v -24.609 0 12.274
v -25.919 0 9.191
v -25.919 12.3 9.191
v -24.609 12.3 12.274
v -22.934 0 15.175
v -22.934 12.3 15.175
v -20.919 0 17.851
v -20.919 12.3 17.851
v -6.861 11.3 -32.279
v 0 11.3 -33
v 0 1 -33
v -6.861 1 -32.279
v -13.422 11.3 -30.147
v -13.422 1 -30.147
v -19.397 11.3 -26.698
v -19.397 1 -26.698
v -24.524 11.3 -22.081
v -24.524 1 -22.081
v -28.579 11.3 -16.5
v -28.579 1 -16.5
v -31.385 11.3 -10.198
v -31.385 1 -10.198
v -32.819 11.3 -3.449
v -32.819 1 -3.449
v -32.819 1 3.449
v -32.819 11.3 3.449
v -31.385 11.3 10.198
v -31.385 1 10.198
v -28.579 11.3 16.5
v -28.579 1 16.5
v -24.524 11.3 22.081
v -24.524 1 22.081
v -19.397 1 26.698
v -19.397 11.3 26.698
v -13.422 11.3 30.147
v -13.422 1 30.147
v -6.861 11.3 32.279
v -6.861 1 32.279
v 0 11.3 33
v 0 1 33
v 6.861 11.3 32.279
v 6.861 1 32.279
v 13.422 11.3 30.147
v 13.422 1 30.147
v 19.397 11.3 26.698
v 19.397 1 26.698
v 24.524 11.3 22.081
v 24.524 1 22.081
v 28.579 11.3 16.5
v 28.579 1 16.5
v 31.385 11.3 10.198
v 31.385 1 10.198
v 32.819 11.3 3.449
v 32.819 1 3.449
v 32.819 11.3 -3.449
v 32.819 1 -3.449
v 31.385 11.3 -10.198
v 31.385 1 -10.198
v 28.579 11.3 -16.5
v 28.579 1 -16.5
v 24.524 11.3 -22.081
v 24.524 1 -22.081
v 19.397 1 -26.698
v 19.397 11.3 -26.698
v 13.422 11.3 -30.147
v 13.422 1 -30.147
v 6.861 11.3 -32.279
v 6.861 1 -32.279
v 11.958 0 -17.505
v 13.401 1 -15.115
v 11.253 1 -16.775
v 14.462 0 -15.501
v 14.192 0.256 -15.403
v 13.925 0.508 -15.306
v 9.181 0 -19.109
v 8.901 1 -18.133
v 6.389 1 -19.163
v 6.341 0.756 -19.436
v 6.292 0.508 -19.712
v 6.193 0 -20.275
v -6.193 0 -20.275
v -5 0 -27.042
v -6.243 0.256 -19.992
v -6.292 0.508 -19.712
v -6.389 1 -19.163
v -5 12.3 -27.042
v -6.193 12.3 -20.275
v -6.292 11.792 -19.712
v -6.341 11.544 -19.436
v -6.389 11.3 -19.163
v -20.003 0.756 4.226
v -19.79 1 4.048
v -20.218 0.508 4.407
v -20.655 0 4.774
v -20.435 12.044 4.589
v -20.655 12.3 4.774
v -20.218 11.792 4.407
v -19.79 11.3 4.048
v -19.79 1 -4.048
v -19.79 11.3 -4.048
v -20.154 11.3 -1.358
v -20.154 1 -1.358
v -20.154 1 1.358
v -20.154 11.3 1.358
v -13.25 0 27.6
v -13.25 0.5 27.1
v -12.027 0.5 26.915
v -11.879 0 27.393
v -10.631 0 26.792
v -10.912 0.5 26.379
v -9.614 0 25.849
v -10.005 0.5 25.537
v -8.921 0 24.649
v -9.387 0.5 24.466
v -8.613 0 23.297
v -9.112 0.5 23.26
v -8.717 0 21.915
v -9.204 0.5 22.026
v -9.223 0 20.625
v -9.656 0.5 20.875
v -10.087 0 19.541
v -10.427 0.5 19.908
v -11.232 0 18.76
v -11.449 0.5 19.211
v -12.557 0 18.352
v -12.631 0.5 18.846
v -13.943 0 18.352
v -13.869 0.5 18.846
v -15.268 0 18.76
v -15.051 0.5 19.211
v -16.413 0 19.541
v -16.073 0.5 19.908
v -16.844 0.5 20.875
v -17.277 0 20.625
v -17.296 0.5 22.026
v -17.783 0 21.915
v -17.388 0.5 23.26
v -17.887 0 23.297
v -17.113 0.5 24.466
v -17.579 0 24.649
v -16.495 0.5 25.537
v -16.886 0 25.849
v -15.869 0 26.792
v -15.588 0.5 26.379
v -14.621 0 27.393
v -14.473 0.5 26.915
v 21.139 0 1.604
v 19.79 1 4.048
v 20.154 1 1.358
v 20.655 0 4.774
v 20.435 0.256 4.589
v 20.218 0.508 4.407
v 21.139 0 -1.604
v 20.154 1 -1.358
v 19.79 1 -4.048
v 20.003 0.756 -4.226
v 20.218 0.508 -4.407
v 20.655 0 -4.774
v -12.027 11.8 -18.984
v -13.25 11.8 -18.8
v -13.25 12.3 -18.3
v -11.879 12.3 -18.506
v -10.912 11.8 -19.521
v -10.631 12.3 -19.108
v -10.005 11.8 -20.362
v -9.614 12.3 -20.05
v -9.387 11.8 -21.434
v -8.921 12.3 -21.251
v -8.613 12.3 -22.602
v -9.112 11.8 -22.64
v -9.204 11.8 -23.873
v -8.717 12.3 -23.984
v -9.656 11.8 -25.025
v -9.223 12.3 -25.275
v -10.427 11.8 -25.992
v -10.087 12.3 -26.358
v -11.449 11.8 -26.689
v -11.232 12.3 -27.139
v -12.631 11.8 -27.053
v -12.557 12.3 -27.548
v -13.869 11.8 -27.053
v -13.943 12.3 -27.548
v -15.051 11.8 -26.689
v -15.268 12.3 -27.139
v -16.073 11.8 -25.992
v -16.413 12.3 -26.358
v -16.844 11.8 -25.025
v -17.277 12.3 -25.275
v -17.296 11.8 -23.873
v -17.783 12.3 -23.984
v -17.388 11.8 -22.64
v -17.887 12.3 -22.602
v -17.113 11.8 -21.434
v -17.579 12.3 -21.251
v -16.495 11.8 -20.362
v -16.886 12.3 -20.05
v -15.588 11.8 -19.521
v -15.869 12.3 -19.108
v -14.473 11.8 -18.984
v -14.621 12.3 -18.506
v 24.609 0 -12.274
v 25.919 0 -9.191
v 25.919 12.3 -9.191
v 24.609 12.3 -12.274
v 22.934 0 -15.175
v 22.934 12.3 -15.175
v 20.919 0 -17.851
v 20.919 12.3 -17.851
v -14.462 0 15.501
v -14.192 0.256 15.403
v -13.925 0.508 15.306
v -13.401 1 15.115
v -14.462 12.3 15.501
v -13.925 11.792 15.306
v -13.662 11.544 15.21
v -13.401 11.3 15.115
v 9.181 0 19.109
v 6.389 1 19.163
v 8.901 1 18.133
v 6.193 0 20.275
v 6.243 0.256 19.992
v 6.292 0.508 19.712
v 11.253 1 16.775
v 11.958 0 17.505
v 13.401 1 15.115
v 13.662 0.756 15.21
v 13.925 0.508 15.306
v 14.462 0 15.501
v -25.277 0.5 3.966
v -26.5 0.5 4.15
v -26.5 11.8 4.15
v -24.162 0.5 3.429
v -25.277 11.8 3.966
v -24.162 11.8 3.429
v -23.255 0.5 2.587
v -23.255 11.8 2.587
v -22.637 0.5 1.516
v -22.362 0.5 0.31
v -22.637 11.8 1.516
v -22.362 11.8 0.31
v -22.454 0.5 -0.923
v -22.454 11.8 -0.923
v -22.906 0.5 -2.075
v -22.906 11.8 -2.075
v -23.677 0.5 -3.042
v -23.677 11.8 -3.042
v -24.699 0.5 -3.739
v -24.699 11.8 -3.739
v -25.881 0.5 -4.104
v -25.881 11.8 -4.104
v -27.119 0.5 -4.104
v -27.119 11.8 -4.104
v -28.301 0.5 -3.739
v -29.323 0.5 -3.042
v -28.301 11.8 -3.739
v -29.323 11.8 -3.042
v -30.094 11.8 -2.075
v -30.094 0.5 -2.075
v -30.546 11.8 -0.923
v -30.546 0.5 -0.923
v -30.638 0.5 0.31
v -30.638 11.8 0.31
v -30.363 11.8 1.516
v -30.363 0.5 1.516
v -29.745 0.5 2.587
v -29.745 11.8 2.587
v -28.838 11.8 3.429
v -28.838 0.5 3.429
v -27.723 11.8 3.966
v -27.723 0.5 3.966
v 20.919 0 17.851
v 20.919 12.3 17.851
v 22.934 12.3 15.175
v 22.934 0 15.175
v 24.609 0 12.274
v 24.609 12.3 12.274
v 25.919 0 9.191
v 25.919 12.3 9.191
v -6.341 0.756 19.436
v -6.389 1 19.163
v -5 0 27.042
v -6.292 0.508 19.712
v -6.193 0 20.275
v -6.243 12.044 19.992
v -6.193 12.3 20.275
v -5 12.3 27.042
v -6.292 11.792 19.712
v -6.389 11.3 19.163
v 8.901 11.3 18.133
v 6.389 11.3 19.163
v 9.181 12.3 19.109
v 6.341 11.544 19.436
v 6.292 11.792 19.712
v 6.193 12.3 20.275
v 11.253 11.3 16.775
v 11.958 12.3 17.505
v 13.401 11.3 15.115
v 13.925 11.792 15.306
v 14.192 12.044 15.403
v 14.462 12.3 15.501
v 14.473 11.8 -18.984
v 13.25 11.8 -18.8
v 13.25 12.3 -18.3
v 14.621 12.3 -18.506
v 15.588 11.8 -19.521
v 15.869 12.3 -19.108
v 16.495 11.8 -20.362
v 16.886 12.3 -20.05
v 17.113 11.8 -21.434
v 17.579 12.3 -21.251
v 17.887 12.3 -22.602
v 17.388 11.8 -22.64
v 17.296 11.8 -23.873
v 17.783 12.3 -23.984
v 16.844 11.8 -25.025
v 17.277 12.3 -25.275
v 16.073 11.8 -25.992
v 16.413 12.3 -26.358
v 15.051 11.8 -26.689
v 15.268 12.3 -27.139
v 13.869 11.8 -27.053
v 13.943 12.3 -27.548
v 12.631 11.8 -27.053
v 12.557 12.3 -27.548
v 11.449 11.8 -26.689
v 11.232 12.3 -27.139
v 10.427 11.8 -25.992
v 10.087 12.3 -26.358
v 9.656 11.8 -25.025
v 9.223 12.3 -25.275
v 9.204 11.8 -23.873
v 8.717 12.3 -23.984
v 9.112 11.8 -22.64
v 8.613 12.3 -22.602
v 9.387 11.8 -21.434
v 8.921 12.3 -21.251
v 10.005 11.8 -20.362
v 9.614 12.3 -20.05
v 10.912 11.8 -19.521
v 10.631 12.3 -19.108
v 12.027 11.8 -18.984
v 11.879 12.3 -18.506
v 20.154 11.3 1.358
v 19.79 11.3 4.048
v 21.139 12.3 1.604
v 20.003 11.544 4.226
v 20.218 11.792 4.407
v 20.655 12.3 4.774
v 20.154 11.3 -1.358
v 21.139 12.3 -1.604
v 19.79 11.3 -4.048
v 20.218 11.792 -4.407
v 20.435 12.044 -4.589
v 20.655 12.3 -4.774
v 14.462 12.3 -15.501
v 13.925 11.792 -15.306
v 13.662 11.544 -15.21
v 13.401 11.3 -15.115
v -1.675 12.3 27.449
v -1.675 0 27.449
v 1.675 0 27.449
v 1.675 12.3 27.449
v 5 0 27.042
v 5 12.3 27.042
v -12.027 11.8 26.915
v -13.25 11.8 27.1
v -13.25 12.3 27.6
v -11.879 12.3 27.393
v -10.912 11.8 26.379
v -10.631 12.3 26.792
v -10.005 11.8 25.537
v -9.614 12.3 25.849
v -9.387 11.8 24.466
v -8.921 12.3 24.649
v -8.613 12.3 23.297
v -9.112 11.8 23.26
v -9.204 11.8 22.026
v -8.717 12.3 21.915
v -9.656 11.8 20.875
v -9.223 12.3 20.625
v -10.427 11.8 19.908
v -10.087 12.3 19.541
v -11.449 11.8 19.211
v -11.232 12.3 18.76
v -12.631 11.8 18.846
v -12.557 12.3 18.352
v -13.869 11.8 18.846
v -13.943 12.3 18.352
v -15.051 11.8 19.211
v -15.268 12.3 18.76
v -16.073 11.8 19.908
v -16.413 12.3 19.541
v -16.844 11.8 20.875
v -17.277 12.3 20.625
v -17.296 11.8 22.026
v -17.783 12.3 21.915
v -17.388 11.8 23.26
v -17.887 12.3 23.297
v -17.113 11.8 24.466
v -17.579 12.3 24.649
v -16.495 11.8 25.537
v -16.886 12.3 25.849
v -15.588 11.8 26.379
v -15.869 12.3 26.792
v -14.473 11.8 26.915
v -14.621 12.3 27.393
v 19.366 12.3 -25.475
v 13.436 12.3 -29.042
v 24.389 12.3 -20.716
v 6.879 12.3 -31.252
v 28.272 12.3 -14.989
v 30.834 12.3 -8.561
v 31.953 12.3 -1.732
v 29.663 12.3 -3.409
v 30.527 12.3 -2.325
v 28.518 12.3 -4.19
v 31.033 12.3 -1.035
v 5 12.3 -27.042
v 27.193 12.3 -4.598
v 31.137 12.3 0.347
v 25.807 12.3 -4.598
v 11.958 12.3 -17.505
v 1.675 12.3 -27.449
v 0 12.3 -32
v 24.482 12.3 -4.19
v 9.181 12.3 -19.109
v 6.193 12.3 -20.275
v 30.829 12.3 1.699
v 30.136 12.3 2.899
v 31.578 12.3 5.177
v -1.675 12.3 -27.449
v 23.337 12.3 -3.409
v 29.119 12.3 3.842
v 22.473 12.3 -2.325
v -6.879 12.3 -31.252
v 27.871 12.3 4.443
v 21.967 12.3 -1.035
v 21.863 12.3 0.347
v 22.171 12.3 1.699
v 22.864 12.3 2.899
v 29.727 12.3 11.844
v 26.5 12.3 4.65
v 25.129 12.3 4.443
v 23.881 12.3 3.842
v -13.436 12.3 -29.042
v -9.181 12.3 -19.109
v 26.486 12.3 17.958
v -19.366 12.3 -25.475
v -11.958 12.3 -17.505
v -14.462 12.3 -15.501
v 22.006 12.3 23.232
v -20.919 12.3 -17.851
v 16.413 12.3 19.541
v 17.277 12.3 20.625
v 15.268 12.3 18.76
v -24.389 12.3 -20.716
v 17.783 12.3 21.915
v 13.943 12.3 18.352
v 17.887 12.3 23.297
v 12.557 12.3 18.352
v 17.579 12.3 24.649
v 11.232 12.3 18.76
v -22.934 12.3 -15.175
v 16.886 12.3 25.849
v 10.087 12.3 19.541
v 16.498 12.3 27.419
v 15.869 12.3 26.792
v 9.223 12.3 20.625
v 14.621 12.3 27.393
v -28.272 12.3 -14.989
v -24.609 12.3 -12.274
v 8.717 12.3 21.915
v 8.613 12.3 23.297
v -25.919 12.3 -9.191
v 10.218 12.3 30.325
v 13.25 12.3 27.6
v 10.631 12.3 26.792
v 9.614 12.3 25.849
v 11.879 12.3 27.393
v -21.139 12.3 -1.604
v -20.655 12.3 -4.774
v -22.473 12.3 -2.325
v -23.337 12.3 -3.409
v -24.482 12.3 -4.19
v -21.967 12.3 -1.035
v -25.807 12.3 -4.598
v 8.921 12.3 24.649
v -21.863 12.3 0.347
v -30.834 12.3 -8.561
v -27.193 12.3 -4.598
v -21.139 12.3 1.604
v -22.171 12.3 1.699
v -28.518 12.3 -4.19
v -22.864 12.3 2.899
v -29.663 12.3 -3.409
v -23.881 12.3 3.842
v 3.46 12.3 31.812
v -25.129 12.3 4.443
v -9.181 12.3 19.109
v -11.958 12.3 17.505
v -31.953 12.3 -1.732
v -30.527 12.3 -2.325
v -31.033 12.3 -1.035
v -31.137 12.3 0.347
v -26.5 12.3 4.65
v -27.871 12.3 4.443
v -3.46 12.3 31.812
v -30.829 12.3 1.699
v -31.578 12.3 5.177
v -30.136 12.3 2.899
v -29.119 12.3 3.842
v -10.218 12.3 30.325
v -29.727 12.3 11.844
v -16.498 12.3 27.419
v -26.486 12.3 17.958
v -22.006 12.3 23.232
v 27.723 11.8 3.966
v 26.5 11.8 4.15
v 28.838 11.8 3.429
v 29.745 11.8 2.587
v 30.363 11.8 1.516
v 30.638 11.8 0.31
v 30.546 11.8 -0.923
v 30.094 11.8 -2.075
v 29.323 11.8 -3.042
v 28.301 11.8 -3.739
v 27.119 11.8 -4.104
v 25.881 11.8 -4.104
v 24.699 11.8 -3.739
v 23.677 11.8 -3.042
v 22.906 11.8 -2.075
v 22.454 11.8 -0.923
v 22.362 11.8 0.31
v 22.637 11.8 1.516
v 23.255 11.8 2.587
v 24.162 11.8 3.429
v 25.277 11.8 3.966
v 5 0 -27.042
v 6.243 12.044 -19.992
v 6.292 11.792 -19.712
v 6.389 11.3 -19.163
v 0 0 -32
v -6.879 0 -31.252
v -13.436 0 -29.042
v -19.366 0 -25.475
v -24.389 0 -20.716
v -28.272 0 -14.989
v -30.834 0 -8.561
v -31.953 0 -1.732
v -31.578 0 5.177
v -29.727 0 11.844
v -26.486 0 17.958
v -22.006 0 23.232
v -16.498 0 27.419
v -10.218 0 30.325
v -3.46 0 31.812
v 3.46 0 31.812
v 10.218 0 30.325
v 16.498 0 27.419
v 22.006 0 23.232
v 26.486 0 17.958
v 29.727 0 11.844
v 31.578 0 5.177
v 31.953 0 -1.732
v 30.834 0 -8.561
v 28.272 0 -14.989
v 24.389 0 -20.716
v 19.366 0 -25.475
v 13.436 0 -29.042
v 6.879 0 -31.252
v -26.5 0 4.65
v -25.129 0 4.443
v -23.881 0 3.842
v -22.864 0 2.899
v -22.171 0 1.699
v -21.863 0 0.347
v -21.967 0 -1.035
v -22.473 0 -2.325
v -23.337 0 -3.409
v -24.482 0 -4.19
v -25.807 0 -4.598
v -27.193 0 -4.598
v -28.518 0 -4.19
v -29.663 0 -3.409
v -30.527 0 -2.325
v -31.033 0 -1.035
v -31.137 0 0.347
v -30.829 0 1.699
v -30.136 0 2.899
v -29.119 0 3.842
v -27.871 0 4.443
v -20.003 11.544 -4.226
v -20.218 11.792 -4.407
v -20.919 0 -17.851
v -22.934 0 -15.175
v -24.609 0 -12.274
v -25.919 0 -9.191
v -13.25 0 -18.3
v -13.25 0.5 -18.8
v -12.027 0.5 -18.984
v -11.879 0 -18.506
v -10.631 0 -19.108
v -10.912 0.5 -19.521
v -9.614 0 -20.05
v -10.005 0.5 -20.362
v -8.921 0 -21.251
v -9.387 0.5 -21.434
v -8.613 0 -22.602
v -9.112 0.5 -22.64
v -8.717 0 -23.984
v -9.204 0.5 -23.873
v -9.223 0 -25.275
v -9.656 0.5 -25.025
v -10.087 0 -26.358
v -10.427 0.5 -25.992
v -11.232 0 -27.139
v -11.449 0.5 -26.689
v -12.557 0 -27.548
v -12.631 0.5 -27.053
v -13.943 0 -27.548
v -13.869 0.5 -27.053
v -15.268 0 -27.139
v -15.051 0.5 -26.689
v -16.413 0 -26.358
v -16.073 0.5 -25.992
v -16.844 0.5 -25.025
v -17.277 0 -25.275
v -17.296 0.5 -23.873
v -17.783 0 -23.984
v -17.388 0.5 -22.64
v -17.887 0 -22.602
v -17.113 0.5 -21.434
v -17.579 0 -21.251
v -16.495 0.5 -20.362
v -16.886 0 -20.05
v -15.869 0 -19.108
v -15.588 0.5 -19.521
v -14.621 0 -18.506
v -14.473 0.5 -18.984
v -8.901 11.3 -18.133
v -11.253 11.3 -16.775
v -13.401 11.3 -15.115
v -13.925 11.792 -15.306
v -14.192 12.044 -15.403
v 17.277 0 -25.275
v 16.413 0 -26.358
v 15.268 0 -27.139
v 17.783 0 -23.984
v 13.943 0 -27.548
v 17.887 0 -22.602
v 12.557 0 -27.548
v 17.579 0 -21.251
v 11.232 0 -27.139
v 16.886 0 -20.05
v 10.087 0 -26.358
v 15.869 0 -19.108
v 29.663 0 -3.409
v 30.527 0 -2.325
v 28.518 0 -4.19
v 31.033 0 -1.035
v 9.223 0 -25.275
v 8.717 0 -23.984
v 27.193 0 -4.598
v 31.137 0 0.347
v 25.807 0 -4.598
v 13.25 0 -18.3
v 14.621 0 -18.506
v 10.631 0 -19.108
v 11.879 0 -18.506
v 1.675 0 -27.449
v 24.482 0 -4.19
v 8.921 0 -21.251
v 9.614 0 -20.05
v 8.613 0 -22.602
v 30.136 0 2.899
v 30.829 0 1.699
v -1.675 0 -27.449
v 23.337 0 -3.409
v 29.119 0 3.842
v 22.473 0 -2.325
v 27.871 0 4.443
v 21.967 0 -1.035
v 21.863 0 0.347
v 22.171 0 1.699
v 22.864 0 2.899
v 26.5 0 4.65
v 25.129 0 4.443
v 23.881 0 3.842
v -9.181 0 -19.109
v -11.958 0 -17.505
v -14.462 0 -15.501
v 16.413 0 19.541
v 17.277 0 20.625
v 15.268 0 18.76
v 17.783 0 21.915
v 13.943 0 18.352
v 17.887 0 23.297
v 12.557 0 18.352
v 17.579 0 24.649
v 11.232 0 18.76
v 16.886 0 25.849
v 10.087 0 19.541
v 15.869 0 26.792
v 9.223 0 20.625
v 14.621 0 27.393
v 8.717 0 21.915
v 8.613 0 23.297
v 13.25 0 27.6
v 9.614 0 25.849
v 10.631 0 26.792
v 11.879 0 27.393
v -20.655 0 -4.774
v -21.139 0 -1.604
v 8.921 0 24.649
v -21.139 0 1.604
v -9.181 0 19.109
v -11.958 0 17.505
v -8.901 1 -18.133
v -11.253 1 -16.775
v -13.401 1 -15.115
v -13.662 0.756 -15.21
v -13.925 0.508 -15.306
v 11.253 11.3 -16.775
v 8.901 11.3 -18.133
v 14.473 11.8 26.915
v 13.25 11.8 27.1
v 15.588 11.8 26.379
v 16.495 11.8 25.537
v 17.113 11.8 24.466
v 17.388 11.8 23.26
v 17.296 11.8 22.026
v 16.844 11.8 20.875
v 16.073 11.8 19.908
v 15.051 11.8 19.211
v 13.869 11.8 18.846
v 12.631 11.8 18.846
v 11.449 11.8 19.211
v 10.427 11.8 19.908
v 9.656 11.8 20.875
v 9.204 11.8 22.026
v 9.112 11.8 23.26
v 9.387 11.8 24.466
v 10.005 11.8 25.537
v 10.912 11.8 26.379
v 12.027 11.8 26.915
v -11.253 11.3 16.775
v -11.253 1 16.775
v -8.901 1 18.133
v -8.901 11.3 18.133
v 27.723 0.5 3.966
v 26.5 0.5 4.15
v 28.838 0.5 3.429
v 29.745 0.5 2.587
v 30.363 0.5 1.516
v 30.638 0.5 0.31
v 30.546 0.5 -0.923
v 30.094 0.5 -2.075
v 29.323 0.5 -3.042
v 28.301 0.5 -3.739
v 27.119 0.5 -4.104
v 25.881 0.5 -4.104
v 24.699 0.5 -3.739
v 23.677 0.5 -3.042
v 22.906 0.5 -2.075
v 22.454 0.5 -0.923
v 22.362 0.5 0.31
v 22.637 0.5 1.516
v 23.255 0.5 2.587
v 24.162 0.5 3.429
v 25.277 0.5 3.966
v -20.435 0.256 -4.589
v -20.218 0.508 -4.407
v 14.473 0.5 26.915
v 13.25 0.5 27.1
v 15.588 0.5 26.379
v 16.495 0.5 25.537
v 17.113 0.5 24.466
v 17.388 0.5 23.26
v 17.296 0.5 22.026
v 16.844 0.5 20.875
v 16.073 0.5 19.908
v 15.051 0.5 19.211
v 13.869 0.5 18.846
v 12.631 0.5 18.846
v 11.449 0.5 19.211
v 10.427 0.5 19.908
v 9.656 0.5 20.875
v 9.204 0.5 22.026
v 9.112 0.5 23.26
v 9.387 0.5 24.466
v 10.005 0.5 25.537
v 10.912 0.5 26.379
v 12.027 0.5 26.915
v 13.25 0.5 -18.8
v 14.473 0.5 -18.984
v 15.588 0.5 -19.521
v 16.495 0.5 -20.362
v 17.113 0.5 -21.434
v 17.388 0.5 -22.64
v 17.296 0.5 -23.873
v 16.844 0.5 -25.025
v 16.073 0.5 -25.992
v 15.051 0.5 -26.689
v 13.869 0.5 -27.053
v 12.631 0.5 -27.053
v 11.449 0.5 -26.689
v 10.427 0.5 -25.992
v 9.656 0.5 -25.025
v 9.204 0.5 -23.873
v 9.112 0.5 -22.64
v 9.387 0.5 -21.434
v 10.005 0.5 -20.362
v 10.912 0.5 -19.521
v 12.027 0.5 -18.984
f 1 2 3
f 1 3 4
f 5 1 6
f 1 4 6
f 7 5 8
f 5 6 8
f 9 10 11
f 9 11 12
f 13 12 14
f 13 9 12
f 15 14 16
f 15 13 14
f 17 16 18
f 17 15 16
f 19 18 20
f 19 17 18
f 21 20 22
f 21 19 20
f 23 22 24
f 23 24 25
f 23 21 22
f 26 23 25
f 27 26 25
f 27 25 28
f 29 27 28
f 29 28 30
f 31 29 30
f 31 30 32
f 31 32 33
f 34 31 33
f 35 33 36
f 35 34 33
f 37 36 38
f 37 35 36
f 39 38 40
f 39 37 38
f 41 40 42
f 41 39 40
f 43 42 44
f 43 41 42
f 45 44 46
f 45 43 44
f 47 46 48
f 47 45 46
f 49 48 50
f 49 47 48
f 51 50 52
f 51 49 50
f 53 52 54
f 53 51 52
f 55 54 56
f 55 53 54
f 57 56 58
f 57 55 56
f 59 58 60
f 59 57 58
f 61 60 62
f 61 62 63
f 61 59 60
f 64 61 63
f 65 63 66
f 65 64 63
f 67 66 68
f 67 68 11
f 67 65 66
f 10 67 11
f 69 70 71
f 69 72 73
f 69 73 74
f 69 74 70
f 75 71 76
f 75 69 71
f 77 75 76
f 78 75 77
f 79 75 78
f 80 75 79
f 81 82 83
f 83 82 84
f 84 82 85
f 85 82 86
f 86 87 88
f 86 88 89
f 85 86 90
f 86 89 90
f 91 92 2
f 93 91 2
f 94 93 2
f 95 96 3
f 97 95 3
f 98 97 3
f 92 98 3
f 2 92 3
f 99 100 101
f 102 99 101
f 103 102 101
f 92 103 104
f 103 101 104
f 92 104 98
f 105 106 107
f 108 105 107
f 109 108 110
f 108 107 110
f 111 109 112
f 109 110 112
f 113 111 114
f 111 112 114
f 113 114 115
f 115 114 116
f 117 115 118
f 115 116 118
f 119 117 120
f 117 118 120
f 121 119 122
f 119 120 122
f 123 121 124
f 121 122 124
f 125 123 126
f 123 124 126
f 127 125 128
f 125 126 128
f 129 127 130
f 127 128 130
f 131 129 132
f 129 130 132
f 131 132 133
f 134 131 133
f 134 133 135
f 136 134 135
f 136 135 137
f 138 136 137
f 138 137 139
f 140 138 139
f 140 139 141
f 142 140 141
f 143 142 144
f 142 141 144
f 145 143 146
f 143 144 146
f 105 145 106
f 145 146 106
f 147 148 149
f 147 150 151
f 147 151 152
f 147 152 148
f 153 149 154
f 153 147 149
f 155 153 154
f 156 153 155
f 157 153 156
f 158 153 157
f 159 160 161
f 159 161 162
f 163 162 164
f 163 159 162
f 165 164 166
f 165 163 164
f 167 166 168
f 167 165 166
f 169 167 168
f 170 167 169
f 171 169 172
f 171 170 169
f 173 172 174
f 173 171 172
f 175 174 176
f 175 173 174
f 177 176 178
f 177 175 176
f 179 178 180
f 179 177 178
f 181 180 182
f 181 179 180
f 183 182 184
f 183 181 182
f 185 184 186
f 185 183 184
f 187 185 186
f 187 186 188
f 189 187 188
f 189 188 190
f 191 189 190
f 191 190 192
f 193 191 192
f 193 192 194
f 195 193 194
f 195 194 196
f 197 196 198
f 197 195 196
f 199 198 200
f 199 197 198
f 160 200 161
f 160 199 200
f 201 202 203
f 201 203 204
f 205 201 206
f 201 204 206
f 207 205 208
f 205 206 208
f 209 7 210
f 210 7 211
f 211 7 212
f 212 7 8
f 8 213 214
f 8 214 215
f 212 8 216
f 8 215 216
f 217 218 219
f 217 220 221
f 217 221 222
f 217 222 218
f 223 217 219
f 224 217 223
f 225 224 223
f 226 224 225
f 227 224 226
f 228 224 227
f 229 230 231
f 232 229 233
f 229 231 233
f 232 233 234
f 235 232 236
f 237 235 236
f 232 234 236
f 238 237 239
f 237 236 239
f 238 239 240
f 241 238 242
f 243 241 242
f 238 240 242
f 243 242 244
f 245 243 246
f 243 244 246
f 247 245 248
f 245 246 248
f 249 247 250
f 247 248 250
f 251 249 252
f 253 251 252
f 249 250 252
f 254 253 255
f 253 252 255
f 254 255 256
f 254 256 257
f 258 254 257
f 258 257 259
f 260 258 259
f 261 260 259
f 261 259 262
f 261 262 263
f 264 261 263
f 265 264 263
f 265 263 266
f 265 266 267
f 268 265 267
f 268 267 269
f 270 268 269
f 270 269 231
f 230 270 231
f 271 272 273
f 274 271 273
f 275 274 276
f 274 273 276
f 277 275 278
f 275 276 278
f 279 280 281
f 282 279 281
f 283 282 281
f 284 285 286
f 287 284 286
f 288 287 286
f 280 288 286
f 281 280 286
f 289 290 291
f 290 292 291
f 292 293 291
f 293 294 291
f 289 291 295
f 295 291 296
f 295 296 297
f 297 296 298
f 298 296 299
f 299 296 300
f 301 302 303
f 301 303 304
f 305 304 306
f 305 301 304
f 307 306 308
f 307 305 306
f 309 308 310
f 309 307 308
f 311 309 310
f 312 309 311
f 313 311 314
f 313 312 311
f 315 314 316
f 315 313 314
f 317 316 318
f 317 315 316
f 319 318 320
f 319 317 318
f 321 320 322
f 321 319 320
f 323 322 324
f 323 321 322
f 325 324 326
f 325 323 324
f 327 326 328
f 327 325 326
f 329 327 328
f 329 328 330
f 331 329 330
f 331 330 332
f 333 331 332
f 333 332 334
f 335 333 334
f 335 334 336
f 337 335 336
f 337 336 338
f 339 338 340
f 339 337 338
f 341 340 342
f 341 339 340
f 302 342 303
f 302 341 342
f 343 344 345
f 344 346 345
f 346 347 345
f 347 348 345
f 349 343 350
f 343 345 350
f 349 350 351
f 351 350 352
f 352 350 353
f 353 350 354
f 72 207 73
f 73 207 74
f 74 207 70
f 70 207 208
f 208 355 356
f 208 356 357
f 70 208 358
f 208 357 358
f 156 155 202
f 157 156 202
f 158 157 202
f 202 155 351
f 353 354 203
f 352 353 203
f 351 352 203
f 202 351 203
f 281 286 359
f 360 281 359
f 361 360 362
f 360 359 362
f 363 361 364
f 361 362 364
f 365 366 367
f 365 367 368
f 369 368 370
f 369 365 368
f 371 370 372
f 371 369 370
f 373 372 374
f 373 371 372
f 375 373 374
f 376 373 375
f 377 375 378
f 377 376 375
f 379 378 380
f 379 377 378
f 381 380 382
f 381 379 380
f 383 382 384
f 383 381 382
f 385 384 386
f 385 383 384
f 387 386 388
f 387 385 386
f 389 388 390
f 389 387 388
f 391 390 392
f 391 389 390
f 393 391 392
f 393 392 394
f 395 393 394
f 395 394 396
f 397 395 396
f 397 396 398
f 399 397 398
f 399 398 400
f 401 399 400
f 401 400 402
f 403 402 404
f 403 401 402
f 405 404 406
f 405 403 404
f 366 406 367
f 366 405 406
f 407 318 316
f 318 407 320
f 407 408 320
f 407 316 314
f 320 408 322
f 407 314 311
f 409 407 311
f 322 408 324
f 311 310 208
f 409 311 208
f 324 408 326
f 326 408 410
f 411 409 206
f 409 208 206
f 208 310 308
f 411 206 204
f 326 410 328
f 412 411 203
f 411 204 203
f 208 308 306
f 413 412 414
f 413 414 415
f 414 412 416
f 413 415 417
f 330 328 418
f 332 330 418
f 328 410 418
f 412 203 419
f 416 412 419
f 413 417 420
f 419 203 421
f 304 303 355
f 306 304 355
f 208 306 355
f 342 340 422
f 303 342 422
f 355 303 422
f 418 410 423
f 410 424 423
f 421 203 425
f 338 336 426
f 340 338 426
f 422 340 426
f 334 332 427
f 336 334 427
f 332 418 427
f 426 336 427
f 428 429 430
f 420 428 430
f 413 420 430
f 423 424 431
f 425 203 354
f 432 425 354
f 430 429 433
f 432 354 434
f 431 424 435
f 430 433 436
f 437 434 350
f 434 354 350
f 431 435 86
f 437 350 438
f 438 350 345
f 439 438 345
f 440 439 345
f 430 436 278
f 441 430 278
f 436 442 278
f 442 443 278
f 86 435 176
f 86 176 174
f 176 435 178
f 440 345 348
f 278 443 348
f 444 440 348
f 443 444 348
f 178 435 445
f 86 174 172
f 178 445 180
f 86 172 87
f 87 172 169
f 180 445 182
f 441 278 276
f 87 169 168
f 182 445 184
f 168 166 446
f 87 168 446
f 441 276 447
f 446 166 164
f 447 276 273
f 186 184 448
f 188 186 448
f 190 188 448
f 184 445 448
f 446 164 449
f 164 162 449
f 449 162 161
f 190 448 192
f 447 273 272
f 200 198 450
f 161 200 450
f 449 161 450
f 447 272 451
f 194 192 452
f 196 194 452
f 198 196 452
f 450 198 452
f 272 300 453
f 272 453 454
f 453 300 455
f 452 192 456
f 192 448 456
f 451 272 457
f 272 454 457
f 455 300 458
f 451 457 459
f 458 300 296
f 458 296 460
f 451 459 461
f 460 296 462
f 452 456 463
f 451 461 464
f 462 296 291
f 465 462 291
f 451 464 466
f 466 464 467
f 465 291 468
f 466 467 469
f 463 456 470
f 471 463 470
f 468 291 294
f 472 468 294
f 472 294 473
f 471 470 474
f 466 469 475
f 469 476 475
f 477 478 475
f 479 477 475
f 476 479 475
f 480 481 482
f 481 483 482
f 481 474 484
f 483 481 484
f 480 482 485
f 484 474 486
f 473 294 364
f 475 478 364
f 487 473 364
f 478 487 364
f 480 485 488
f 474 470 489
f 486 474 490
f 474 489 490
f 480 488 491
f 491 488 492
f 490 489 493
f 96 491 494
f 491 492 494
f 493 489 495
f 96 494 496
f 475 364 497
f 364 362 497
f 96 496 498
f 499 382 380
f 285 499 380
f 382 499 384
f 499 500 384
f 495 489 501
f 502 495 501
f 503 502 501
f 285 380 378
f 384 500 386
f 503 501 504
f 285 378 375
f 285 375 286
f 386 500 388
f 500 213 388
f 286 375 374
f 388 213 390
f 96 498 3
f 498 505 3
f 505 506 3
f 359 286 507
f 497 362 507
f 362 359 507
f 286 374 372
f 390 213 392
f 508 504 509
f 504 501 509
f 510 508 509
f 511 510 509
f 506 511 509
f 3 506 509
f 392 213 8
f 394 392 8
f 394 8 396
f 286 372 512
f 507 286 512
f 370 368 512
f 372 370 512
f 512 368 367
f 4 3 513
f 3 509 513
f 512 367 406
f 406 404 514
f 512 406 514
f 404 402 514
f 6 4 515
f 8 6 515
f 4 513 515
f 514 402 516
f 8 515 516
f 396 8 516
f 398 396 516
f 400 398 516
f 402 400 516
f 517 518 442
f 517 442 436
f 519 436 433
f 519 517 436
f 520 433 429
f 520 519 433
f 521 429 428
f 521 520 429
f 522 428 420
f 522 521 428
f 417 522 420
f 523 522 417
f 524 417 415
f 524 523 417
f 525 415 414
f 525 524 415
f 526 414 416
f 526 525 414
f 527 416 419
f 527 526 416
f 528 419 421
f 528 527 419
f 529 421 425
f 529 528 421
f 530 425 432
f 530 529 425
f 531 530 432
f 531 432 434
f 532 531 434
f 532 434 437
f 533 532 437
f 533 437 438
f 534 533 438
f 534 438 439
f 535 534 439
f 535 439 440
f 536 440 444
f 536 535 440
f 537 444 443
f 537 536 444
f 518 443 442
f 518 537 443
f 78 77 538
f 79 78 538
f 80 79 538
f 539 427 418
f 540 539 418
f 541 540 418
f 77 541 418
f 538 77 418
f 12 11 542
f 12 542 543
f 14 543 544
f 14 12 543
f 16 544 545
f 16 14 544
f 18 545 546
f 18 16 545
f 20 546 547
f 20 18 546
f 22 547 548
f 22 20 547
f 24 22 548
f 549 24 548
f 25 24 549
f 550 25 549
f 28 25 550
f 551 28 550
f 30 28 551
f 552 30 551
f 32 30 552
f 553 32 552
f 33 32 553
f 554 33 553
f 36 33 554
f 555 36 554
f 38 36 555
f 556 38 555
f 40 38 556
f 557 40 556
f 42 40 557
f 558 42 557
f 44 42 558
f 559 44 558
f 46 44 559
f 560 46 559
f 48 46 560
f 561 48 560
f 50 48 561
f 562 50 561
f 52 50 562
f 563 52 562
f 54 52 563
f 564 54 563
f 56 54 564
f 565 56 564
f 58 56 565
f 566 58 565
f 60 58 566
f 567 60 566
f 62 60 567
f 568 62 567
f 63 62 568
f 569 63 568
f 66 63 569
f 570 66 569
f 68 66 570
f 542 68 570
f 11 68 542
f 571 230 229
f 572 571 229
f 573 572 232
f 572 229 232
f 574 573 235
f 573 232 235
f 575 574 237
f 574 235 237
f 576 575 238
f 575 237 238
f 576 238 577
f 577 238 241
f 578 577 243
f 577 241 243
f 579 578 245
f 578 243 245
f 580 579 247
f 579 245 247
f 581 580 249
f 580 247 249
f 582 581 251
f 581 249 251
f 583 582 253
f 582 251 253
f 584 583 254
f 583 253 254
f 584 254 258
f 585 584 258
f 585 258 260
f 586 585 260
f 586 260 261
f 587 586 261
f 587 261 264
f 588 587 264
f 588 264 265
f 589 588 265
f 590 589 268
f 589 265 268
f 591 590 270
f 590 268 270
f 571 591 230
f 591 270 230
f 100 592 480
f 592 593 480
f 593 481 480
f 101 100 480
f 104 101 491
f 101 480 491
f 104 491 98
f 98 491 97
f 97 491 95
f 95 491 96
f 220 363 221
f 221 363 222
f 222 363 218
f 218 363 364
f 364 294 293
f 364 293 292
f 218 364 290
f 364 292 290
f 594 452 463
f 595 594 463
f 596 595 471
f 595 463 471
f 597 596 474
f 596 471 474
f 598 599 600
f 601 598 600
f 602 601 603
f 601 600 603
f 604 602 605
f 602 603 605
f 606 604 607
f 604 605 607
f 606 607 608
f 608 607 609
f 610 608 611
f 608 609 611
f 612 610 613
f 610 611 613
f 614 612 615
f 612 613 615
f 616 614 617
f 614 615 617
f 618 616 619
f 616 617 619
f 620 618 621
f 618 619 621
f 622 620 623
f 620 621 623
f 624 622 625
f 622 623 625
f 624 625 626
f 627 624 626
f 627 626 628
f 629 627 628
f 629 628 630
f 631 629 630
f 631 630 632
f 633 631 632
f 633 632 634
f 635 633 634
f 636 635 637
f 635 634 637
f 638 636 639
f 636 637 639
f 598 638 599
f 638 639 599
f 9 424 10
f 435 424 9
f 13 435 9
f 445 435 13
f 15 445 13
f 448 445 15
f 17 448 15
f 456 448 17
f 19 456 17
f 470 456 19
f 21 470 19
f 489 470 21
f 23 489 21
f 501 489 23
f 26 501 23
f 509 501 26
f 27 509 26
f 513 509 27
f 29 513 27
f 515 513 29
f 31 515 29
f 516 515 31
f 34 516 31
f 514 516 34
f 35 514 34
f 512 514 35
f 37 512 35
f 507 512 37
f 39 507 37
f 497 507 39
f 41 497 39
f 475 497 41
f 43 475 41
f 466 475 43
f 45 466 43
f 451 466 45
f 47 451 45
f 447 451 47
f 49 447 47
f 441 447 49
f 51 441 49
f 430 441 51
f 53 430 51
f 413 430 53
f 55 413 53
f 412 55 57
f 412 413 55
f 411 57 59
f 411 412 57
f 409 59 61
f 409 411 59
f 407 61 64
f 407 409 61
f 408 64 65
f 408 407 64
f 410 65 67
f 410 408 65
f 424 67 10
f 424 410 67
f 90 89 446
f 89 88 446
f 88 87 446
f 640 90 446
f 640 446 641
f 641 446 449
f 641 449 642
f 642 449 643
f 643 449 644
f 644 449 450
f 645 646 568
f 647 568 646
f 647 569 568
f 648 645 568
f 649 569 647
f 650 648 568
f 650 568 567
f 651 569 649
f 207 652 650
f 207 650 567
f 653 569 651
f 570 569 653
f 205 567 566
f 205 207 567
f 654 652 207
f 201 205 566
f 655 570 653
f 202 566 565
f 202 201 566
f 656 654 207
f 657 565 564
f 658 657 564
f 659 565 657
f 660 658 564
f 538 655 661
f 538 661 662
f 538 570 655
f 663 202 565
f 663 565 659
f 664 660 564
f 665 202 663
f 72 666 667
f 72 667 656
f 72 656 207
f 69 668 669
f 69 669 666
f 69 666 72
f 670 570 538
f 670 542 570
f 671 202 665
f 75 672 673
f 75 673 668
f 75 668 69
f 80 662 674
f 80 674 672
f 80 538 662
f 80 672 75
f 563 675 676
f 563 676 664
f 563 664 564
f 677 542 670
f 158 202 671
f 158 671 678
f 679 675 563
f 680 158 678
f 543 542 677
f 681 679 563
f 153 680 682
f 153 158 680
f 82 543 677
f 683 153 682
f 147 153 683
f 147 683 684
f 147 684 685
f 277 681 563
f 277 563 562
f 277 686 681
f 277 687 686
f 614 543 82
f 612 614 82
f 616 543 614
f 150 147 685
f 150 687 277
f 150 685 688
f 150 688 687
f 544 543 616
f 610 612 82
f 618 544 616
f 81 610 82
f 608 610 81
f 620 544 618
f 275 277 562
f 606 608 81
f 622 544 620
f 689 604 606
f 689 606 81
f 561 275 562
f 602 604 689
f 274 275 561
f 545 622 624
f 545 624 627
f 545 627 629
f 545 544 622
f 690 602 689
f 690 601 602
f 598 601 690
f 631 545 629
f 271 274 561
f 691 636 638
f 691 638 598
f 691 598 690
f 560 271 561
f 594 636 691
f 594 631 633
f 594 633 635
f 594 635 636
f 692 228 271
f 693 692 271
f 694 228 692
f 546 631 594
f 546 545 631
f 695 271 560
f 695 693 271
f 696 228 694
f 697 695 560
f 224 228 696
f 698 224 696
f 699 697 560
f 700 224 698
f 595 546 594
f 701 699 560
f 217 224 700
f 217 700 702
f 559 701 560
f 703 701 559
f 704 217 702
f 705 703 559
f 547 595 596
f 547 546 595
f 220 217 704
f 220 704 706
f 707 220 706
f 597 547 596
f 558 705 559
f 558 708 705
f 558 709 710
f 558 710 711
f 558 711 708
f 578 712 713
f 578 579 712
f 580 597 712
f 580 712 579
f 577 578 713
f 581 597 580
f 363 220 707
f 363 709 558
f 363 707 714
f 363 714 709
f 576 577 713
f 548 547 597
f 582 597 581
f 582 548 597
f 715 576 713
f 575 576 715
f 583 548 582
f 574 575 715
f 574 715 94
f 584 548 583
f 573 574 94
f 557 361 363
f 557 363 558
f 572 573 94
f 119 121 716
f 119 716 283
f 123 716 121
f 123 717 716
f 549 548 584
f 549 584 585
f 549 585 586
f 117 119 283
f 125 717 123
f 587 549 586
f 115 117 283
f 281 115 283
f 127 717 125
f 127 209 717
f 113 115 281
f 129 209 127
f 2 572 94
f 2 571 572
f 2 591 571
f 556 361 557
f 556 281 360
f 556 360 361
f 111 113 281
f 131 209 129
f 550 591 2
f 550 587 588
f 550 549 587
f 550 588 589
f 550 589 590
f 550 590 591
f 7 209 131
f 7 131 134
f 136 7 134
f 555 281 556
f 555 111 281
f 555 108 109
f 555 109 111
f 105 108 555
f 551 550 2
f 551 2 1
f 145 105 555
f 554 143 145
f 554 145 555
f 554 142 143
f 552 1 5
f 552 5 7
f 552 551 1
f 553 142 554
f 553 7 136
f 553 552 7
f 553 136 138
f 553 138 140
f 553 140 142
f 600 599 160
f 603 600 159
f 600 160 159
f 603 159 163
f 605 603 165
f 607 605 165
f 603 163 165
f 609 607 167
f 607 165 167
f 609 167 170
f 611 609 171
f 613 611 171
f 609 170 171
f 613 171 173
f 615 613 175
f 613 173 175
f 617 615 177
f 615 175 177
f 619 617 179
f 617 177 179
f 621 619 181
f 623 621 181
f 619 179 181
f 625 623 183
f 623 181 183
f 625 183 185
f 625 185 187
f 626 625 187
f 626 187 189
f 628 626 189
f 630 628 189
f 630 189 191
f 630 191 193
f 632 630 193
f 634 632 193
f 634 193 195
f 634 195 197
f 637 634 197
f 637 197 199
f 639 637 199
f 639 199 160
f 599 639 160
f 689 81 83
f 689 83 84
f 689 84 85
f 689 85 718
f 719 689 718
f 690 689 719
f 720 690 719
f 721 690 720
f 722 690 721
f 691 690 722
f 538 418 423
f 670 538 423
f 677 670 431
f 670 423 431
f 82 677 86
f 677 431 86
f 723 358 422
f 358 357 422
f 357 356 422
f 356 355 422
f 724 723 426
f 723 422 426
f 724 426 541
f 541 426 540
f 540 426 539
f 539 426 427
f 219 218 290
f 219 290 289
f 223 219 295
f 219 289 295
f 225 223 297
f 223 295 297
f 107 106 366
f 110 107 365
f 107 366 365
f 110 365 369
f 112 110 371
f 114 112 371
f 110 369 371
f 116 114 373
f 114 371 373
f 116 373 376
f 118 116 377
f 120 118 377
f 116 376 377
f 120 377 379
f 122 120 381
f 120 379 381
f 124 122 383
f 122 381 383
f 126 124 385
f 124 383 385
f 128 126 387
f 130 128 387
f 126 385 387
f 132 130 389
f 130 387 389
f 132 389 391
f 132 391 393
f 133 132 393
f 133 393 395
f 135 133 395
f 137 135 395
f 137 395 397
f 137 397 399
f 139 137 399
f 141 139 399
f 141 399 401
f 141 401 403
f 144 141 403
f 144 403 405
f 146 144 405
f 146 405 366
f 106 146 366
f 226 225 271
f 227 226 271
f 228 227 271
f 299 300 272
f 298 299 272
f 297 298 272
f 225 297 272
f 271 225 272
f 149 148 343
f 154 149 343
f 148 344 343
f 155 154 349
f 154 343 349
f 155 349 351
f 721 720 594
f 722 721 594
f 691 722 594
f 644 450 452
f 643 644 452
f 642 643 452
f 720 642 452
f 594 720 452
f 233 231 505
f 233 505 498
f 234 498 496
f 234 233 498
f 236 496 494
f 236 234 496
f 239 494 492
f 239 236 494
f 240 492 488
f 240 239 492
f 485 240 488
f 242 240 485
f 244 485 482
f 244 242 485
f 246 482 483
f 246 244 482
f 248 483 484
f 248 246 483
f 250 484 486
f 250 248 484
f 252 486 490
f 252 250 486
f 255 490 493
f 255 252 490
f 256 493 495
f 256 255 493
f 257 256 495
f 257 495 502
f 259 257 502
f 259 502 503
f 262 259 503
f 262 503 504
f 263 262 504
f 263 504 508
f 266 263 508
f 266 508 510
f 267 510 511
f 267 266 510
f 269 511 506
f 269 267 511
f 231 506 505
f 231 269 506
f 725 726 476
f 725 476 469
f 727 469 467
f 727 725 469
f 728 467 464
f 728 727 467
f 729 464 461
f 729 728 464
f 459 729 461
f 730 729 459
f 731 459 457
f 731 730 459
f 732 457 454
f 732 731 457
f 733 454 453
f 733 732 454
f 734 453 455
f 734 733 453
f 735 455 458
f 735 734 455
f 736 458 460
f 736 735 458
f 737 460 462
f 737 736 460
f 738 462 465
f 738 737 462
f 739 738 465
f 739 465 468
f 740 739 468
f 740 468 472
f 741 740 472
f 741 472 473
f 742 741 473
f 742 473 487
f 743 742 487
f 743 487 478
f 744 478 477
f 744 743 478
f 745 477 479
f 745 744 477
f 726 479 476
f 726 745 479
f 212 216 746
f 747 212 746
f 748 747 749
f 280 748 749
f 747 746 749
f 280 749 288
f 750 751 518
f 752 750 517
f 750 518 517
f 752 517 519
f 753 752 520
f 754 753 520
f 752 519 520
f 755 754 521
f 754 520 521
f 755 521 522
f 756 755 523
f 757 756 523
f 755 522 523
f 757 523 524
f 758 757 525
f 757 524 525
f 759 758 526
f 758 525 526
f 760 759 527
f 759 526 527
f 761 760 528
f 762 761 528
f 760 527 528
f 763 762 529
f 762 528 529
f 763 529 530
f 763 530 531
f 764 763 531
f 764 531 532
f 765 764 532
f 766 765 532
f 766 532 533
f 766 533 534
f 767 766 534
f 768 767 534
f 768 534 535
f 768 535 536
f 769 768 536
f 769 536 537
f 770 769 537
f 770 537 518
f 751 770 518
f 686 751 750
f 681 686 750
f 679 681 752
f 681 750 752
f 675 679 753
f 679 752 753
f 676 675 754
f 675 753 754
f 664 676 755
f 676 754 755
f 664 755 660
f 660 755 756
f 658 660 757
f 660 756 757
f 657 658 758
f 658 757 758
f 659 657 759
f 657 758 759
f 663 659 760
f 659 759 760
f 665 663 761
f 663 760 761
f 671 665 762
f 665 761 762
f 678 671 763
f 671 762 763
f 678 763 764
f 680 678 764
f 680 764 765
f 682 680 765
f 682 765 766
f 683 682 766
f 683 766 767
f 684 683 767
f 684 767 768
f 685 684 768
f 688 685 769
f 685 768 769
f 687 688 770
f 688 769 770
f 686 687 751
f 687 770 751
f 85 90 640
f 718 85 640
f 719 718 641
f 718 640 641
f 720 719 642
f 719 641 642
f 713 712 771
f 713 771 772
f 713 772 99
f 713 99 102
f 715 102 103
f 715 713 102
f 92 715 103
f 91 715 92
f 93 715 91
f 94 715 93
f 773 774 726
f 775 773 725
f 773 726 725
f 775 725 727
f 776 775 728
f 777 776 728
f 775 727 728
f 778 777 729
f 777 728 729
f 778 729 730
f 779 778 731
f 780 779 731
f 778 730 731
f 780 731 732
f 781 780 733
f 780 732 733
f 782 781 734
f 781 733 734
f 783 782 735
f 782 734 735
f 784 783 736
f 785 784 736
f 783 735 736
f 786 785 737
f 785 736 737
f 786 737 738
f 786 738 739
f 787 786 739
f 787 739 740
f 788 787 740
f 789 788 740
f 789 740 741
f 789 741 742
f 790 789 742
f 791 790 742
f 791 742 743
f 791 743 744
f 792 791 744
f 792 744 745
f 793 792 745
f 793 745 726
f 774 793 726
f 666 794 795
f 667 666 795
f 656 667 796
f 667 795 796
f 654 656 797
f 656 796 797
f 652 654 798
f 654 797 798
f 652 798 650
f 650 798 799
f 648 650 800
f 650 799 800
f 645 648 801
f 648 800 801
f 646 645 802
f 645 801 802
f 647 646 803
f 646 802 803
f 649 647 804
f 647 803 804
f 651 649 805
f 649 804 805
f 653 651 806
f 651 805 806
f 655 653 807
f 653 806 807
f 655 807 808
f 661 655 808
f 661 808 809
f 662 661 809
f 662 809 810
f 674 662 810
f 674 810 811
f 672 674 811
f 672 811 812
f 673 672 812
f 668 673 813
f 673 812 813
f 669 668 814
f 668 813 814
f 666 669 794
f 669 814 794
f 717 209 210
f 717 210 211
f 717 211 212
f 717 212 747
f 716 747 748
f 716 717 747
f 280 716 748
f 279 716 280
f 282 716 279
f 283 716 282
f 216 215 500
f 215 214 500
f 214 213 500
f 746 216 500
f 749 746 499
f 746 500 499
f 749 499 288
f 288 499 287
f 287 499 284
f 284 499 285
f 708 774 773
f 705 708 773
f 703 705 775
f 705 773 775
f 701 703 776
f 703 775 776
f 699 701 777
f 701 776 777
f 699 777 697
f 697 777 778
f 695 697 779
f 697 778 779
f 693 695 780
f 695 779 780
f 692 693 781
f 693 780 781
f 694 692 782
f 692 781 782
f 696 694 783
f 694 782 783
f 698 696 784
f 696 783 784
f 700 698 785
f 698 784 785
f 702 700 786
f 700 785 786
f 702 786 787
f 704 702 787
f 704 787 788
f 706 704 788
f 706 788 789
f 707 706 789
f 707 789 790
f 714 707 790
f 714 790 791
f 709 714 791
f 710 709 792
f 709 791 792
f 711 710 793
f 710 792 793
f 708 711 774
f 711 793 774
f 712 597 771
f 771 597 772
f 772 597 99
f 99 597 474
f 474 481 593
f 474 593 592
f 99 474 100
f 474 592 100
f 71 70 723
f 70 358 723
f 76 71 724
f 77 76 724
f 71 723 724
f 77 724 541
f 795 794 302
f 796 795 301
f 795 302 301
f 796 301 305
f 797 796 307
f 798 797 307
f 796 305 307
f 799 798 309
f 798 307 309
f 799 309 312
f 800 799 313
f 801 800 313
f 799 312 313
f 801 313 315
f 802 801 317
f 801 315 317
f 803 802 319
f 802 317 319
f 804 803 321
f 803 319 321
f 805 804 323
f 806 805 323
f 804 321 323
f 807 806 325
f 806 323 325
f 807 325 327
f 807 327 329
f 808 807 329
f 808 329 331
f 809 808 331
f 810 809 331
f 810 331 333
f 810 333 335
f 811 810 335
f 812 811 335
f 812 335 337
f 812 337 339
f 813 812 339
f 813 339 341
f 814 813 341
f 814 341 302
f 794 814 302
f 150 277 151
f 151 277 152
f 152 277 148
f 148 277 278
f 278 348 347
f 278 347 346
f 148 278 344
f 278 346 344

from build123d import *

# Parameters (mm, degrees)
ESBO_O1_W             = 12.8
ESBO_O1_H             = 12.3
CHANFRO1_SIZE         = 1
CORTE_EXTRUS_O1_DEPTH = 49.262718531
ESBO_O3_R             = 4.15
CORTE_EXTRUS_O2_DEPTH = 49.262718531
CHANFRO2_SIZE         = 0.5


with BuildPart() as part:
    # Esboço1 → Revolução1 (revolve)
    with BuildSketch(Plane.XY, mode=Mode.PRIVATE) as revolu_o1_sk:
        with Locations((26.6, 6.15)):
            Rectangle(ESBO_O1_W, ESBO_O1_H)
    revolve(revolu_o1_sk.sketch.rotate(Axis((0, -47.977777778, 0), (0, 1, 0)), 90), axis=Axis((0, -47.977777778, 0), (0, 1, 0)))

    # Chanfro1
    chanfro1_edges = [part.edges().sort_by_distance(p)[0] for p in [
        (0, 0, 33),
        (0, 0, 20.2),
        (0, 12.3, 20.2),
        (0, 12.3, 33),
    ]]
    chamfer(chanfro1_edges, length=CHANFRO1_SIZE)

    # Esboço2 → Corte-extrusão1 (cut, through all)
    with BuildSketch(Plane(origin=(0, 12.3, 0), x_dir=(1, 0, 0), z_dir=(0, 1, 0))):
        with BuildLine():
            Line((20.918742494, 17.850944302), (10.058223509, 13.898038663))
            Line((10.058223509, 13.898038663), (17.065166299, 1.761657744))
            Line((17.065166299, 1.761657744), (25.918742494, 9.190690264))
            ThreePointArc((25.918742494, 9.190690264), (23.815698604, 13.75), (20.918742494, 17.850944302))
        make_face()
        with BuildLine():
            Line((-5, 27.041634566), (-7.00694279, 15.659696407))
            Line((-7.00694279, 15.659696407), (7.00694279, 15.659696407))
            Line((7.00694279, 15.659696407), (5, 27.041634566))
            ThreePointArc((5, 27.041634566), (0, 27.5), (-5, 27.041634566))
        make_face()
        with BuildLine():
            Line((25.918742494, -9.190690264), (17.065166299, -1.761657744))
            Line((17.065166299, -1.761657744), (10.058223509, -13.898038663))
            Line((10.058223509, -13.898038663), (20.918742494, -17.850944302))
            ThreePointArc((20.918742494, -17.850944302), (23.815698604, -13.75), (25.918742494, -9.190690264))
        make_face()
        with BuildLine():
            Line((5, -27.041634566), (7.00694279, -15.659696407))
            Line((7.00694279, -15.659696407), (-7.00694279, -15.659696407))
            Line((-7.00694279, -15.659696407), (-5, -27.041634566))
            ThreePointArc((-5, -27.041634566), (0, -27.5), (5, -27.041634566))
        make_face()
        with BuildLine():
            Line((-20.918742494, -17.850944302), (-10.058223509, -13.898038663))
            Line((-10.058223509, -13.898038663), (-17.065166299, -1.761657744))
            Line((-17.065166299, -1.761657744), (-25.918742494, -9.190690264))
            ThreePointArc((-25.918742494, -9.190690264), (-23.815698604, -13.75), (-20.918742494, -17.850944302))
        make_face()
        with BuildLine():
            Line((-25.918742494, 9.190690264), (-17.065166299, 1.761657744))
            Line((-17.065166299, 1.761657744), (-10.058223509, 13.898038663))
            Line((-10.058223509, 13.898038663), (-20.918742494, 17.850944302))
            ThreePointArc((-20.918742494, 17.850944302), (-23.815698604, 13.75), (-25.918742494, 9.190690264))
        make_face()
    extrude(amount=-CORTE_EXTRUS_O1_DEPTH, mode=Mode.SUBTRACT)

    # Esboço3 → Corte-extrusão2 (cut, through all)
    with BuildSketch(Plane(origin=(0, 12.3, 0), x_dir=(1, 0, 0), z_dir=(0, 1, 0))):
        with Locations(Location((-26.5, 0, 0), (0, 0, 270))):
            Circle(ESBO_O3_R)
        with Locations(Location((-13.25, 22.9496732, 0), (0, 0, 270))):
            Circle(ESBO_O3_R)
        with Locations(Location((13.25, 22.9496732, 0), (0, 0, 270))):
            Circle(ESBO_O3_R)
        with Locations(Location((26.5, 0, 0), (0, 0, 270))):
            Circle(ESBO_O3_R)
        with Locations(Location((13.25, -22.9496732, 0), (0, 0, 270))):
            Circle(ESBO_O3_R)
        with Locations(Location((-13.25, -22.9496732, 0), (0, 0, 270))):
            Circle(ESBO_O3_R)
    extrude(amount=-CORTE_EXTRUS_O2_DEPTH, mode=Mode.SUBTRACT)

    # Chanfro2
    chanfro2_edges = [part.edges().sort_by_distance(p)[0] for p in [
        (-26.5, 0, -4.15),
        (-26.5, 12.3, -4.15),
        (-13.25, 0, -27.0996732),
        (-13.25, 12.3, -27.0996732),
        (13.25, 0, -27.0996732),
        (13.25, 12.3, -27.0996732),
        (26.5, 0, -4.15),
        (26.5, 12.3, -4.15),
        (13.25, 0, 18.7996732),
        (13.25, 12.3, 18.7996732),
        (-13.25, 0, 18.7996732),
        (-13.25, 12.3, 18.7996732),
    ]]
    chamfer(chanfro2_edges, length=CHANFRO2_SIZE)


solid = part.part
